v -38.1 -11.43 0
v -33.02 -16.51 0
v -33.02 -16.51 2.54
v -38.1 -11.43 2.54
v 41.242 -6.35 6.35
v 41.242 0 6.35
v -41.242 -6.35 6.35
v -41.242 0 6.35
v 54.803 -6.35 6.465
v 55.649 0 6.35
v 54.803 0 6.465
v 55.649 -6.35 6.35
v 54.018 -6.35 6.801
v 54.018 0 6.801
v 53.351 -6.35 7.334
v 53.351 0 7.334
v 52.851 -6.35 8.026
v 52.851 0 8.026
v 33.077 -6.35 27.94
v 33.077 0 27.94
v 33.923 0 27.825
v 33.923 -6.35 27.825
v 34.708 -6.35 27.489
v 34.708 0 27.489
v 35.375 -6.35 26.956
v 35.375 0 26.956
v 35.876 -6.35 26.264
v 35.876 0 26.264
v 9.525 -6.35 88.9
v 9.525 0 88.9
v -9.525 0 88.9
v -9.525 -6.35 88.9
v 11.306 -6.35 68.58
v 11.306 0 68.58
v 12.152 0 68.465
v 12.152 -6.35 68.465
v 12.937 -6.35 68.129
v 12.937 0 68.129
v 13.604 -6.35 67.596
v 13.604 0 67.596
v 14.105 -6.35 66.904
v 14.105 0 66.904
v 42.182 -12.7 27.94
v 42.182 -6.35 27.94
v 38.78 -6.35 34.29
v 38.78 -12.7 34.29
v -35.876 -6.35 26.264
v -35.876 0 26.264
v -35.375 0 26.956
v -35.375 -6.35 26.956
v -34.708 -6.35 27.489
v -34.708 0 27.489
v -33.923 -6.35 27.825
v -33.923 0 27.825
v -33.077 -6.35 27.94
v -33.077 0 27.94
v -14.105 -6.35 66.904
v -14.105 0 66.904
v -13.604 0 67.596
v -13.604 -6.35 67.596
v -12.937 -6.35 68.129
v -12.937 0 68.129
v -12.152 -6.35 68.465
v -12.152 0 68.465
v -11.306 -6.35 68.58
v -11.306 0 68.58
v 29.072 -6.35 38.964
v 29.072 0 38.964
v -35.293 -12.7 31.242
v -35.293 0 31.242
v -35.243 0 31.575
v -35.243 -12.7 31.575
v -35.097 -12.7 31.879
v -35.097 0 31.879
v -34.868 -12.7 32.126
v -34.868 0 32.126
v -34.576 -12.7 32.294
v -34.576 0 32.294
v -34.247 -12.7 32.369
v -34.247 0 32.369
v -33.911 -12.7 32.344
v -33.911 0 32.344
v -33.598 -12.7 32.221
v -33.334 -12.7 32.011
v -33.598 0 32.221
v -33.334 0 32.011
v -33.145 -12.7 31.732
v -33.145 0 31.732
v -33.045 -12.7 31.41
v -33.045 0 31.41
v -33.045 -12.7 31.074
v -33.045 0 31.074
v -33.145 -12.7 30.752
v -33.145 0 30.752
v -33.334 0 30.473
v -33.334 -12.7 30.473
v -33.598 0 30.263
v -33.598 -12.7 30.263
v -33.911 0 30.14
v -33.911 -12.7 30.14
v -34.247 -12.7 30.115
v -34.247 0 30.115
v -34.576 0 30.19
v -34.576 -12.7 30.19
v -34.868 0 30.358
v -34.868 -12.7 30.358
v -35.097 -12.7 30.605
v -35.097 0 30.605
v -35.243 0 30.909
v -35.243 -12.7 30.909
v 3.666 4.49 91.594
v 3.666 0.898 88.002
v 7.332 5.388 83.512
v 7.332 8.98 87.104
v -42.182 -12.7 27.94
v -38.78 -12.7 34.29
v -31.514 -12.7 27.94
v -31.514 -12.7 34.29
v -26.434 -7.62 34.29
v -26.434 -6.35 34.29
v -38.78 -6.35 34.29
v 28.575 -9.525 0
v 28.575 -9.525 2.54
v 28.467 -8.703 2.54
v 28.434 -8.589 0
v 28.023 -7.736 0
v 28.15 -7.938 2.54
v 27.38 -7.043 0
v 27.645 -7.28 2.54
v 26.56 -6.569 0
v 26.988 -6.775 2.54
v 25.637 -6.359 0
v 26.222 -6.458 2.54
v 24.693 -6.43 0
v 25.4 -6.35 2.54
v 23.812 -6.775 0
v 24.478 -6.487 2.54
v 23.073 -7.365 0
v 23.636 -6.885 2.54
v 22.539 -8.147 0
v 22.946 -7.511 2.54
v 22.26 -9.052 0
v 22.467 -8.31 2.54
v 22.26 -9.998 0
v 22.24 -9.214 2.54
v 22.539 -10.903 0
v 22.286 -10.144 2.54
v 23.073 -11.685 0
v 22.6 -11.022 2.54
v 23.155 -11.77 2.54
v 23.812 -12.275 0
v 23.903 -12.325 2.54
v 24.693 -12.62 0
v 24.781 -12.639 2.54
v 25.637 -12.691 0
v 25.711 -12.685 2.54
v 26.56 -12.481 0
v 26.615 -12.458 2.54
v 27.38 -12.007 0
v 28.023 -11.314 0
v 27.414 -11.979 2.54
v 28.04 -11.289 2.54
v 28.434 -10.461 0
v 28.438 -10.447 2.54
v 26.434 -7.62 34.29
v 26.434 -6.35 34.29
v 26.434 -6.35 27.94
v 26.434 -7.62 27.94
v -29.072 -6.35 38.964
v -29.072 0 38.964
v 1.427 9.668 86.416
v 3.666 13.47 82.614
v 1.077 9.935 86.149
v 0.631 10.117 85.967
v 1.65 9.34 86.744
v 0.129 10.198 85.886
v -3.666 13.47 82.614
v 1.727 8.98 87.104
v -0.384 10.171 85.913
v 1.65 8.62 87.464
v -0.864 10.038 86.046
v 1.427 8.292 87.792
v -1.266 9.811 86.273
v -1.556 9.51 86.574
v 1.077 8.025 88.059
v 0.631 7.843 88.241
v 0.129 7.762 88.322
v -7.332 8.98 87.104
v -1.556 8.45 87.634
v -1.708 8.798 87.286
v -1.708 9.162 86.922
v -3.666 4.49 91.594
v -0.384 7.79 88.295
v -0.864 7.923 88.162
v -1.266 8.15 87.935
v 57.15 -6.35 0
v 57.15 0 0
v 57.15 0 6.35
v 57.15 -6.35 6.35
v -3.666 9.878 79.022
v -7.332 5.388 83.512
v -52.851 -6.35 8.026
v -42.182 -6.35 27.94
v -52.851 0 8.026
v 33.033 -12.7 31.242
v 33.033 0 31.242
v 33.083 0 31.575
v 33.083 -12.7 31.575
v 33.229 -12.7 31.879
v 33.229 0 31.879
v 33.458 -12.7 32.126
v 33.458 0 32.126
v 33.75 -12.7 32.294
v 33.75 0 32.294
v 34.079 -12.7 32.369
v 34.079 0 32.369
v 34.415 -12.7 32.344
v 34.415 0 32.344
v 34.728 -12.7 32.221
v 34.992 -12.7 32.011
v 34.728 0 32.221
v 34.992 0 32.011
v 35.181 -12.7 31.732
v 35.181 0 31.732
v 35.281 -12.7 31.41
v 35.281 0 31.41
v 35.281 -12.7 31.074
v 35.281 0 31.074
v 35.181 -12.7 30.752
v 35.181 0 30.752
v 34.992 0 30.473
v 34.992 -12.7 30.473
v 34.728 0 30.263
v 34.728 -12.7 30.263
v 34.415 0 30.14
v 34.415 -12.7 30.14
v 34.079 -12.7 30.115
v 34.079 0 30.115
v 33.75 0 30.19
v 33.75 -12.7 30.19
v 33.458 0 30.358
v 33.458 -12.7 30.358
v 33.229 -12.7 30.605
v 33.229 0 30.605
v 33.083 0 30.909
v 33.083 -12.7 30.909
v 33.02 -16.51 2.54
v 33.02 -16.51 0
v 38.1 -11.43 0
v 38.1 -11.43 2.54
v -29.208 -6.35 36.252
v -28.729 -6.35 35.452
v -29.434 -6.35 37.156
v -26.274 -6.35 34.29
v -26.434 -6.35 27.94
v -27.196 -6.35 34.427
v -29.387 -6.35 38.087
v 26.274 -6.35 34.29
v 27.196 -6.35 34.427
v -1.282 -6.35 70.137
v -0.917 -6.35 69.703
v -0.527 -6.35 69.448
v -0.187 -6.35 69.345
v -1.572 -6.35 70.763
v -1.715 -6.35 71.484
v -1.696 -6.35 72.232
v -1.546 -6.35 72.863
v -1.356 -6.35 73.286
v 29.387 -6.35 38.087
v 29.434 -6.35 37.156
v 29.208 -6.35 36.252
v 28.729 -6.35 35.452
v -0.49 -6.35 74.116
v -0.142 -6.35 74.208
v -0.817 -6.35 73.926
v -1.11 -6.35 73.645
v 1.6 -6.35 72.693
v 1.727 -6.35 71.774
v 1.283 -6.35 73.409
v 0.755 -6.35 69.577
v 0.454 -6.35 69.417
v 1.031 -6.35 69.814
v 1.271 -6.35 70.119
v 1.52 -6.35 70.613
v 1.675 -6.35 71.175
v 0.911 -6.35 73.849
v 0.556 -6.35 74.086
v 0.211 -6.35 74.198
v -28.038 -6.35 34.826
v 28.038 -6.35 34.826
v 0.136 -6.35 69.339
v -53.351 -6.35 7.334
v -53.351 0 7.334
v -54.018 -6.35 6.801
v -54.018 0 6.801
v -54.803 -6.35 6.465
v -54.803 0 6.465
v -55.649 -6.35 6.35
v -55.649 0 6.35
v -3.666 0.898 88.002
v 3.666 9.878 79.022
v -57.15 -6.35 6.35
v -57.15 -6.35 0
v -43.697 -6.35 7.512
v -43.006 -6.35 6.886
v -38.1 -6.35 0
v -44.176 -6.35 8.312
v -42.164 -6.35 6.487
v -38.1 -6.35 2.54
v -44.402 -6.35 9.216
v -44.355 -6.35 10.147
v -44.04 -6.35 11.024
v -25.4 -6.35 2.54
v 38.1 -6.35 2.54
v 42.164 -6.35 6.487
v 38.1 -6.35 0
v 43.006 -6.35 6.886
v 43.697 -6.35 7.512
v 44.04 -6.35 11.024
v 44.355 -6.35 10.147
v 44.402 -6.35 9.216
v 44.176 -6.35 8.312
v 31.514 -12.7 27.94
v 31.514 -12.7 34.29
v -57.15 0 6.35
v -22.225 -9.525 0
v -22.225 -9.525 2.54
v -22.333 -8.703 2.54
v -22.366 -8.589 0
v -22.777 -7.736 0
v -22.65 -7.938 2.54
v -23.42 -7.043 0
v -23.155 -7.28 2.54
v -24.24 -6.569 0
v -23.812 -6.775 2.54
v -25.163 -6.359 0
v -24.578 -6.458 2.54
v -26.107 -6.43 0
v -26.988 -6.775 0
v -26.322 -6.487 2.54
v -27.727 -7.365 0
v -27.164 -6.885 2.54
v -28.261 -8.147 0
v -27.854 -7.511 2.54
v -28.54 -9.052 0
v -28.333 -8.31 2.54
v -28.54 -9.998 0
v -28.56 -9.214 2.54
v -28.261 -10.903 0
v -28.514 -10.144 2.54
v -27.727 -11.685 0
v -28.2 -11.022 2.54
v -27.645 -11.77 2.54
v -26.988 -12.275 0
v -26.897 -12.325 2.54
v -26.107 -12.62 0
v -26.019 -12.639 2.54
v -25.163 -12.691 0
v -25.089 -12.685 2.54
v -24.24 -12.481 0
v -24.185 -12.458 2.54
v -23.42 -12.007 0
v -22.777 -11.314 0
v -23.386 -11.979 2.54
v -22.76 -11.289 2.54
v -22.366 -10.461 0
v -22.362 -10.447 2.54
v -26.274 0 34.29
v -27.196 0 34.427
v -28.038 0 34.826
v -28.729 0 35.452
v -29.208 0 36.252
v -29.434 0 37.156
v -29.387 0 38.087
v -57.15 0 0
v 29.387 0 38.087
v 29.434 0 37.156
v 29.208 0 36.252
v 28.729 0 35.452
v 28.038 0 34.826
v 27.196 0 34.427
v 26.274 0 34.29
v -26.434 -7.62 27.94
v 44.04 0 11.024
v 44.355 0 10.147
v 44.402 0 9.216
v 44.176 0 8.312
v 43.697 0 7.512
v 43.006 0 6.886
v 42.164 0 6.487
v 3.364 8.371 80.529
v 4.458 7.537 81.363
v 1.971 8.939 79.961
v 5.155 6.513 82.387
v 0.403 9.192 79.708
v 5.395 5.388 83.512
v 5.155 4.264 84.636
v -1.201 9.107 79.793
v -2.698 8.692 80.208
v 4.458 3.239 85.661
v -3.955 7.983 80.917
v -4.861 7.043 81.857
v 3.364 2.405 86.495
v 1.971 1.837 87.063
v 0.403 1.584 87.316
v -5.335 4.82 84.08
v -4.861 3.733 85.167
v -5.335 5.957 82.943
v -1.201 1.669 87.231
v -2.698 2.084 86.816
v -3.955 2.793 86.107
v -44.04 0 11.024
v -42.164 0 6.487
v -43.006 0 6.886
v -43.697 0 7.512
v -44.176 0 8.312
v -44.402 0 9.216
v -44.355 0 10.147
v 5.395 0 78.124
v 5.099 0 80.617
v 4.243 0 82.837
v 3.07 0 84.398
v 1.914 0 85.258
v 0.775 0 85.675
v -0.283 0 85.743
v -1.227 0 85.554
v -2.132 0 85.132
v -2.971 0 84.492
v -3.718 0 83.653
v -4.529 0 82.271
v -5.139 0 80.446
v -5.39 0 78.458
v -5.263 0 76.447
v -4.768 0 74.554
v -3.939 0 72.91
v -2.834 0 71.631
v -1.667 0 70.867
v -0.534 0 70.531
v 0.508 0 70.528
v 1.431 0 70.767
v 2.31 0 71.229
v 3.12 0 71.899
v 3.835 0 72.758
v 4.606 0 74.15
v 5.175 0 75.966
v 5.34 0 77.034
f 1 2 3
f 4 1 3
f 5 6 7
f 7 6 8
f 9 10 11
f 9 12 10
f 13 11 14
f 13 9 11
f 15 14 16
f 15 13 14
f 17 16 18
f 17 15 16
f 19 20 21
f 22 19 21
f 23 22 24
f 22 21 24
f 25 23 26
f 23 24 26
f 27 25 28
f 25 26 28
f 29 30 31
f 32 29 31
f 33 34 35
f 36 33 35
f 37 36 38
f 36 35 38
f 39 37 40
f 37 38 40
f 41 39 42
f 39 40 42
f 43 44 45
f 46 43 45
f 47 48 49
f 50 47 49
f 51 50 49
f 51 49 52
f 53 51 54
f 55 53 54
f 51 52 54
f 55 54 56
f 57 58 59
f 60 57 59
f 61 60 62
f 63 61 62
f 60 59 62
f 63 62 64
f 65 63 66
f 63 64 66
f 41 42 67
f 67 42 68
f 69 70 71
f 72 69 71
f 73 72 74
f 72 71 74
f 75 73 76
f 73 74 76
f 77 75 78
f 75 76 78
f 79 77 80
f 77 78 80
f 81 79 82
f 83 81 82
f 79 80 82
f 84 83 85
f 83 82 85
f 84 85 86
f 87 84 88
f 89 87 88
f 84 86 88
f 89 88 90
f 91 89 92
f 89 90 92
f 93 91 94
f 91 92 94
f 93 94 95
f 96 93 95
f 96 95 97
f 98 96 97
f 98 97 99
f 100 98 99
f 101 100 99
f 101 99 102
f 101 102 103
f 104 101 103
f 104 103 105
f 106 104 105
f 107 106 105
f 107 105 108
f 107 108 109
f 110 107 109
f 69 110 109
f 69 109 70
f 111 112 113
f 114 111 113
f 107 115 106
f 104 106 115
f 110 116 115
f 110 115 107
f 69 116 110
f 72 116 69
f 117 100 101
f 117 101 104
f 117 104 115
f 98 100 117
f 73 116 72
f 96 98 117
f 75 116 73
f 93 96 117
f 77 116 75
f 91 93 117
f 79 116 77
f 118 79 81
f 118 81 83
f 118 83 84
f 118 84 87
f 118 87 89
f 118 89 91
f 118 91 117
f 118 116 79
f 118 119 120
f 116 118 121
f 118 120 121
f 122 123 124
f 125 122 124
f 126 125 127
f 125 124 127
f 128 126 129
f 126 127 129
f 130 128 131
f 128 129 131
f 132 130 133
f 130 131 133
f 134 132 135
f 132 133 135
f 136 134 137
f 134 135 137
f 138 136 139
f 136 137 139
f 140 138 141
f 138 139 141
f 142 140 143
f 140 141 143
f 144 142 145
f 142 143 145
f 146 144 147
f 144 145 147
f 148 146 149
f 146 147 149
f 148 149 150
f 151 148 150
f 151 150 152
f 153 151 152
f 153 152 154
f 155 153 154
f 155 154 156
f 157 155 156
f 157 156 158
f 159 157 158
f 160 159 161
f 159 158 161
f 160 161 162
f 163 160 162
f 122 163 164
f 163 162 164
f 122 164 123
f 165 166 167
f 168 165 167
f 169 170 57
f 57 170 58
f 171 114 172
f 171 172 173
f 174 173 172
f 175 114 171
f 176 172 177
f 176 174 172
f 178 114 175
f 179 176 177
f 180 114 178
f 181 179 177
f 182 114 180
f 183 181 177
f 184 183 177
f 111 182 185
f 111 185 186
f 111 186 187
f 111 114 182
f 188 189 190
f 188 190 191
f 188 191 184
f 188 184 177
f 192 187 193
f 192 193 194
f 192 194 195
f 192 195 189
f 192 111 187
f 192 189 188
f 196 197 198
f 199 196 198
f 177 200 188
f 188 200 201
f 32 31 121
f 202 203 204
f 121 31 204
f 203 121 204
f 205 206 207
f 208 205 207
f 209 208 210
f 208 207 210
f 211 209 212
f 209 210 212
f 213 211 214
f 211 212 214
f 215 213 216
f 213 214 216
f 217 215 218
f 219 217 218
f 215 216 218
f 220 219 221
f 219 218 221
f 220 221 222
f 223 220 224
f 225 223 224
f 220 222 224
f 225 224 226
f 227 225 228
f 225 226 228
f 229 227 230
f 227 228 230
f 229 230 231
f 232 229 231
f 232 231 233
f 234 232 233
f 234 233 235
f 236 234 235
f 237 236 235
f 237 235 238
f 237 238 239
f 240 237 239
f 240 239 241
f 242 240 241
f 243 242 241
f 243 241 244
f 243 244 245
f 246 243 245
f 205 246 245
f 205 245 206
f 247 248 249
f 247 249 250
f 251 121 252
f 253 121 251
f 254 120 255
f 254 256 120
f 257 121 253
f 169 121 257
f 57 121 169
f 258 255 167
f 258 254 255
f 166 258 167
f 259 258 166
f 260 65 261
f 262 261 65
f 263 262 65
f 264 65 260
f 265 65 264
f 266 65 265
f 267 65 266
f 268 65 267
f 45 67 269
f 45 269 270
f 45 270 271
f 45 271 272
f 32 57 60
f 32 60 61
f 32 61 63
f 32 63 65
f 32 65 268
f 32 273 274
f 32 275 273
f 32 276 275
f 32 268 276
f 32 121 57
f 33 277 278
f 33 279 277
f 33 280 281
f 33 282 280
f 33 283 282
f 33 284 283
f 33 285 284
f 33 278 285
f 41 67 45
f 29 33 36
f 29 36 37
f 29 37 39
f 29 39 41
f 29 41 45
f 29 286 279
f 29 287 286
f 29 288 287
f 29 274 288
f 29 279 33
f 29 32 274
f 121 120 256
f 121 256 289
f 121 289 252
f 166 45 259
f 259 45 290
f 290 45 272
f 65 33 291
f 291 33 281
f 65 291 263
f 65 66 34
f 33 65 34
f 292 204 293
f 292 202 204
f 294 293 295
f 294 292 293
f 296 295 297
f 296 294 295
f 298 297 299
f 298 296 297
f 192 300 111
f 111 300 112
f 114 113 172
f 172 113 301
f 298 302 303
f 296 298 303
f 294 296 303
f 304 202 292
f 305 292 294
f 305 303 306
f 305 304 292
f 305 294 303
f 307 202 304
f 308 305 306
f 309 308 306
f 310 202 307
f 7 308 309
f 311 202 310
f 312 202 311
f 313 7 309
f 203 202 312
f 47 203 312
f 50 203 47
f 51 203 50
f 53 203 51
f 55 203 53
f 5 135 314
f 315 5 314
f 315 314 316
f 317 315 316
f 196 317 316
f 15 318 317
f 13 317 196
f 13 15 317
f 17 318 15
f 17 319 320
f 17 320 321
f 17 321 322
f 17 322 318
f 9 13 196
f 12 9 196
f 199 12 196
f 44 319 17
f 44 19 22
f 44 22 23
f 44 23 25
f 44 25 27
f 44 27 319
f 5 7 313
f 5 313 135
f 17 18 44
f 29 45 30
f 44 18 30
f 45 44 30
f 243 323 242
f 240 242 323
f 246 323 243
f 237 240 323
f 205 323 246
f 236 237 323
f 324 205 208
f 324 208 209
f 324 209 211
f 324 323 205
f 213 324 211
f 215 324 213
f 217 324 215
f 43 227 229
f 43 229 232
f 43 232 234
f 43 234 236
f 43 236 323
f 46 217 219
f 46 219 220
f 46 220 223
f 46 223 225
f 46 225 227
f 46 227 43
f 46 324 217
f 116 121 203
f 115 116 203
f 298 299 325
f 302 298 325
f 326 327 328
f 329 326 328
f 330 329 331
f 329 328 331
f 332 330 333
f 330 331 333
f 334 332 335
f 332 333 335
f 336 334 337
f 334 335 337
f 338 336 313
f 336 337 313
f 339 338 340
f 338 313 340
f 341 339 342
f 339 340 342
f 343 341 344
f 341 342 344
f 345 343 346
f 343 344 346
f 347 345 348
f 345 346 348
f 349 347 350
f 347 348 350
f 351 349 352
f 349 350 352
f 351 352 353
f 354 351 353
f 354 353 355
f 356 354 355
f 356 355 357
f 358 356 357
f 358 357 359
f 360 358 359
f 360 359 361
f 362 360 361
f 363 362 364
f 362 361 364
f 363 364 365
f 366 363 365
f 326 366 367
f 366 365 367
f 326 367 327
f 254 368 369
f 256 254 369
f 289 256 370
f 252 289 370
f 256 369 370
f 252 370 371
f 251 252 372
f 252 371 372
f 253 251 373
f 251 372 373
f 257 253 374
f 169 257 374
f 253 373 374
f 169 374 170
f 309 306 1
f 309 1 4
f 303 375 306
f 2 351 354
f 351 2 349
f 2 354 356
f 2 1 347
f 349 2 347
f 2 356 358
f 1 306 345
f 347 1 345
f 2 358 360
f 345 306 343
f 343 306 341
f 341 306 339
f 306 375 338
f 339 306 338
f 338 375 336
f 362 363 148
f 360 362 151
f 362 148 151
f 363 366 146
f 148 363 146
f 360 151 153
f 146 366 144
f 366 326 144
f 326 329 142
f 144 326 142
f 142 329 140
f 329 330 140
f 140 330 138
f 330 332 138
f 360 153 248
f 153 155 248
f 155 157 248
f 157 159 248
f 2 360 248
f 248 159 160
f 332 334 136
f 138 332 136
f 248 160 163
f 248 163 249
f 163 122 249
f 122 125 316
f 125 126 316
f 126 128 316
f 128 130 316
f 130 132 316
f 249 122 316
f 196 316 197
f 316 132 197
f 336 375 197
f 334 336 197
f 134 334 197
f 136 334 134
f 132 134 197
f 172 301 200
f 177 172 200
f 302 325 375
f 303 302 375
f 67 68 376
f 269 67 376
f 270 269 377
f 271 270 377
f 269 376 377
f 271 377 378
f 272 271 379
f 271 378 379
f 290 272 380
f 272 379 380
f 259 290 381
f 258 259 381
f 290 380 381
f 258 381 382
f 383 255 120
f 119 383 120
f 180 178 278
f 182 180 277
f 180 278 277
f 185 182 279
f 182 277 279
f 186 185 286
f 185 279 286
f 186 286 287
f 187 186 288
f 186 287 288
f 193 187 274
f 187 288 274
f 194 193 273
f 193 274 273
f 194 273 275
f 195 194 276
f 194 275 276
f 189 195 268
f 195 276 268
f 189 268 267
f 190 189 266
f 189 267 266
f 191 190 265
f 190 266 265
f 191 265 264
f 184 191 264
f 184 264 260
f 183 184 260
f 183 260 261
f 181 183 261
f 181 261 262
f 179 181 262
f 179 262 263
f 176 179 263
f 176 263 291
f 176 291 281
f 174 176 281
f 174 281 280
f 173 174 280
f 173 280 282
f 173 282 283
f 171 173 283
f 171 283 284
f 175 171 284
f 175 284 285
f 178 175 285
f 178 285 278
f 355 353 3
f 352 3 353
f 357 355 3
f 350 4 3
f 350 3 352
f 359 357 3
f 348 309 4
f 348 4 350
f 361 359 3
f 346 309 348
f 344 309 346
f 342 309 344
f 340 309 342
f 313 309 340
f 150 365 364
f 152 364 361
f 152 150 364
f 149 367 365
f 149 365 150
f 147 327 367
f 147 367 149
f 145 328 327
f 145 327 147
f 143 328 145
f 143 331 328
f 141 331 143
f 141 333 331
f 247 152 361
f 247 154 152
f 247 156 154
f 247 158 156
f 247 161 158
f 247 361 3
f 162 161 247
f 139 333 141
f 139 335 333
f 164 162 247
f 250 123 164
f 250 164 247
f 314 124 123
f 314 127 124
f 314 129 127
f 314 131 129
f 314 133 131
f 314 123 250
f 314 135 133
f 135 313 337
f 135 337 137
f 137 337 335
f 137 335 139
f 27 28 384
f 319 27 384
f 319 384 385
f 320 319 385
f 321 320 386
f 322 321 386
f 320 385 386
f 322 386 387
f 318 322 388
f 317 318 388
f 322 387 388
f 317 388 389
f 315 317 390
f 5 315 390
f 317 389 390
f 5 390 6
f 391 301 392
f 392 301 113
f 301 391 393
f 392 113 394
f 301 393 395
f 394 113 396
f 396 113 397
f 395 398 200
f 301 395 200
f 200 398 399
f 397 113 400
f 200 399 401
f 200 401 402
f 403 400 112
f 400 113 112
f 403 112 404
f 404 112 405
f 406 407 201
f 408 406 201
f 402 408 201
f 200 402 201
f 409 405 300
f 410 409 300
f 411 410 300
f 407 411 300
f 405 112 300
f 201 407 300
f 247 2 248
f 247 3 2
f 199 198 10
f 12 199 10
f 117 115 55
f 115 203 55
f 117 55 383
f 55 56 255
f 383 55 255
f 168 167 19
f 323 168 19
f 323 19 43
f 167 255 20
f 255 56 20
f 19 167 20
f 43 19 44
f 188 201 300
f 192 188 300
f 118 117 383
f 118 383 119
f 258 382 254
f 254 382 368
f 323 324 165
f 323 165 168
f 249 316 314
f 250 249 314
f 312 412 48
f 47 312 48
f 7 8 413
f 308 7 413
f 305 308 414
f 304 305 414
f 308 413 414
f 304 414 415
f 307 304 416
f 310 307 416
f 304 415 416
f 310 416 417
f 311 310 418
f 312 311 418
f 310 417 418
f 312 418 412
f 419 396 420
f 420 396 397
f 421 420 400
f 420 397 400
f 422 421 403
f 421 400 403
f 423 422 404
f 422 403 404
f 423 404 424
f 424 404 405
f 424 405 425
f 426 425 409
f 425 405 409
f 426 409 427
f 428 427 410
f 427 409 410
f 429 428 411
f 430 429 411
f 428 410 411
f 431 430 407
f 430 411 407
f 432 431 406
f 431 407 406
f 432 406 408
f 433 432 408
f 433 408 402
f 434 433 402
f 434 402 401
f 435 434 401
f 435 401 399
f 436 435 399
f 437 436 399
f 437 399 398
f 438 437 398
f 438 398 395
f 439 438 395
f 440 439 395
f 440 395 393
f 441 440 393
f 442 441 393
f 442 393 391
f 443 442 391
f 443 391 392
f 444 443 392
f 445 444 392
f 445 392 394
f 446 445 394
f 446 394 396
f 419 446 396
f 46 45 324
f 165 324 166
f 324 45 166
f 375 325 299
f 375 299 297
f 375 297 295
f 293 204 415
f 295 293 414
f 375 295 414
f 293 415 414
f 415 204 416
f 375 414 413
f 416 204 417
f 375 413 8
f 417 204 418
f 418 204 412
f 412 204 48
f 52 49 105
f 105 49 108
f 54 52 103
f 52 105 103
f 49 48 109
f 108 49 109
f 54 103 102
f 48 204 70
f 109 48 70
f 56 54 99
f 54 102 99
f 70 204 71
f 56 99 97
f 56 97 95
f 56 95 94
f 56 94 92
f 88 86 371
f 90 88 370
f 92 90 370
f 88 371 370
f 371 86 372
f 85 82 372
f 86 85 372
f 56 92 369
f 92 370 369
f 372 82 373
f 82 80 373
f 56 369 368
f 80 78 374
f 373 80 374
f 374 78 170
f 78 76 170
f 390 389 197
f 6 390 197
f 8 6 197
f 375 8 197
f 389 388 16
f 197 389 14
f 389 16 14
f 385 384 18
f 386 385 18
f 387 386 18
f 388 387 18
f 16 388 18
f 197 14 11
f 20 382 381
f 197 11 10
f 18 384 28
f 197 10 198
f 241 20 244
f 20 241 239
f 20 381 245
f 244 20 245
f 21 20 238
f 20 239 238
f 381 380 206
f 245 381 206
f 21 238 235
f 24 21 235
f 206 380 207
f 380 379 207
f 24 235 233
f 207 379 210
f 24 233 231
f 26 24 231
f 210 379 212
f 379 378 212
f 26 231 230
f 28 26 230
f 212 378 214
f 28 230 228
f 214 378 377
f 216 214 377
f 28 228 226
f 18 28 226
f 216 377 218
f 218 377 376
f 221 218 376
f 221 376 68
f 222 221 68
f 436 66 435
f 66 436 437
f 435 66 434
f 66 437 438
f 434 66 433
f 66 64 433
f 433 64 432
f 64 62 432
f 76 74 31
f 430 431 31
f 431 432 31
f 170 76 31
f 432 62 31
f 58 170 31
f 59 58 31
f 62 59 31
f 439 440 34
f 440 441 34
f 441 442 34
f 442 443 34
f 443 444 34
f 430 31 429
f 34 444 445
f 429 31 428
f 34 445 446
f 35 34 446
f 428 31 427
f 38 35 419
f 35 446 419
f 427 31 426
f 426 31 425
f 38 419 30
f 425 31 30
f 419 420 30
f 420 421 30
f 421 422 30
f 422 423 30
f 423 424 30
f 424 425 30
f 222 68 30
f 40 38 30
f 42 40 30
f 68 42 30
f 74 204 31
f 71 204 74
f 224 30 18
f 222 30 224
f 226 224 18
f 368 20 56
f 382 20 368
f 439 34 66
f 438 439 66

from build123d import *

# Parameters (mm, degrees)
F1_DEPTH  = 6.35
F2_R      = 3.175
F3_W      = 76.2
F3_H      = 2.54
F4_DEPTH  = 10.16
F5_SIZE   = 5.08
F7_DEPTH  = 6.35
F8_SIZE   = 5.08
F10_D     = 2.2606
F13_DEPTH = 5.08
F14_R     = 5.3951847675
F15_REACH = 89.7970127444
F17_D     = 3.4544
F19_D     = 6.35
F19_DEPTH = 2.541


with BuildPart() as f1:
    # F0 (on Front) → F1 (new body)
    with BuildSketch(Plane.XZ):
        Polygon((9.525, 88.9), (-9.525, 88.9), (-53.7482142857, 6.35), (-57.15, 0), (57.15, 0), (53.7482142857, 6.35), align=None)
        with BuildLine():
            Line((41.2416306314, 6.35), (-41.2416306314, 6.35))
            ThreePointArc((-41.2416306314, 6.35), (-43.9656820238, 7.8939975439), (-44.0403295363, 11.0243029847))
            Line((-44.0403295363, 11.0243029847), (-35.876043822, 26.2643029847))
            ThreePointArc((-35.876043822, 26.2643029847), (-34.7083473732, 27.4890513924), (-33.0773449171, 27.94))
            Line((-33.0773449171, 27.94), (33.0773449171, 27.94))
            ThreePointArc((33.0773449171, 27.94), (34.7083473732, 27.4890513924), (35.876043822, 26.2643029847))
            Line((35.876043822, 26.2643029847), (44.0403295363, 11.0243029847))
            ThreePointArc((44.0403295363, 11.0243029847), (43.9656820238, 7.8939975439), (41.2416306314, 6.35))
        make_face(mode=Mode.SUBTRACT)
        with BuildLine():
            ThreePointArc((-14.1046152506, 66.9043029847), (-12.9369188018, 68.1290513924), (-11.3059163457, 68.58))
            Line((-11.3059163457, 68.58), (11.3059163457, 68.58))
            ThreePointArc((11.3059163457, 68.58), (12.9369188018, 68.1290513924), (14.1046152506, 66.9043029847))
            Line((14.1046152506, 66.9043029847), (29.0724723934, 38.9643029847))
            ThreePointArc((29.0724723934, 38.9643029847), (28.9978248809, 35.8339975439), (26.2737734886, 34.29))
            Line((26.2737734886, 34.29), (-26.2737734886, 34.29))
            ThreePointArc((-26.2737734886, 34.29), (-28.9978248809, 35.8339975439), (-29.0724723934, 38.9643029847))
            Line((-29.0724723934, 38.9643029847), (-14.1046152506, 66.9043029847))
        make_face(mode=Mode.SUBTRACT)
        Polygon((-57.15, 0), (-53.7482142857, 6.35), (-57.15, 6.35), align=None)
        Polygon((57.15, 6.35), (53.7482142857, 6.35), (57.15, 0), align=None)
    extrude(amount=F1_DEPTH)

    # F2
    f2_edges = [f1.edges().sort_by_distance(p)[0] for p in [
        (53.748214, -3.175, 6.35),
        (-53.748214, -3.175, 6.35),
    ]]
    fillet(f2_edges, radius=F2_R)

    # F3 (on face) → F4 (join)
    with BuildSketch(Plane.XZ.offset(6.35)):
        with Locations((0, 1.27)):
            Rectangle(F3_W, F3_H)
    extrude(amount=F4_DEPTH)

    # F5
    f5_edges = [f1.edges().sort_by_distance(p)[0] for p in [
        (-38.1, -16.51, 1.27),
        (38.1, -16.51, 1.27),
    ]]
    chamfer(f5_edges, length=F5_SIZE)

    # F6 (on face) → F7 (join)
    with BuildSketch(Plane.XZ.offset(6.35)):
        Polygon((-42.1821428571, 27.94), (-33.0773449171, 27.94), (-26.4341428571, 27.94), (-26.4341428571, 34.29), (-38.7803571429, 34.29), align=None)
        Polygon((26.4341428571, 34.29), (26.4341428571, 27.94), (33.0773449171, 27.94), (42.1821428571, 27.94), (38.7803571429, 34.29), align=None)
    extrude(amount=F7_DEPTH)

    # F8
    f8_edges = [f1.edges().sort_by_distance(p)[0] for p in [
        (26.434143, -12.7, 31.115),
        (-26.434143, -12.7, 31.115),
    ]]
    chamfer(f8_edges, length=F8_SIZE)

    # F10 (through all)
    with Locations(Plane.XZ.offset(12.7)):
        with Locations((-34.163, 31.242), (34.163, 31.242)):
            Hole(F10_D / 2)



with BuildPart() as f13:
    # F12 (on face) → F13 (new body)
    with BuildSketch(Plane(origin=(0, 44.45, 44.45), x_dir=(-1, 0, 0), z_dir=(0, 0.7071067812, 0.7071067812))):
        Polygon((-3.6661742094, 48.8917928475), (3.6661742094, 48.8917928475), (7.3323484187, 55.2417928475), (3.6661742094, 61.5917928475), (-3.6661742094, 61.5917928475), (-7.3323484187, 55.2417928475), align=None)
    extrude(amount=F13_DEPTH)


with BuildPart() as f1_1:
    add(f1.part)

    add(f13.part)  # F15 merges F13
    f15_end = f1_1.faces().sort_by_distance((-29.9113566426, 0, 47.7790611404))[0]
    # F14 (on face) → F15 (join, up to a face of the model that its end follows)
    with BuildSketch(Plane(origin=(0, 44.45, 44.45), x_dir=(1, 0, 0), z_dir=(0, -0.7071067812, -0.7071067812))):
        with Locations((0, 55.2417928475)):
            Circle(F14_R)
    f15_long = extrude(amount=F15_REACH, mode=Mode.PRIVATE)
    add(split(f15_long, bisect_by=f15_end, keep=Keep.TOP, mode=Mode.PRIVATE))

    # F17 (through all)
    with Locations(Plane(origin=(0, 48.0421024484, 48.0421024484), x_dir=(-1, 0, 0), z_dir=(0, 0.7071067812, 0.7071067812))):
        with Locations((0, 55.2417928475)):
            Hole(F17_D / 2)

    # F19 (through all, one way)
    with BuildSketch(Plane.XY.offset(2.54)):
        with Locations((-25.4, -9.525), (25.4, -9.525)):
            Circle(F19_D / 2)
    extrude(amount=-F19_DEPTH, mode=Mode.SUBTRACT)


solid = f1_1.part
